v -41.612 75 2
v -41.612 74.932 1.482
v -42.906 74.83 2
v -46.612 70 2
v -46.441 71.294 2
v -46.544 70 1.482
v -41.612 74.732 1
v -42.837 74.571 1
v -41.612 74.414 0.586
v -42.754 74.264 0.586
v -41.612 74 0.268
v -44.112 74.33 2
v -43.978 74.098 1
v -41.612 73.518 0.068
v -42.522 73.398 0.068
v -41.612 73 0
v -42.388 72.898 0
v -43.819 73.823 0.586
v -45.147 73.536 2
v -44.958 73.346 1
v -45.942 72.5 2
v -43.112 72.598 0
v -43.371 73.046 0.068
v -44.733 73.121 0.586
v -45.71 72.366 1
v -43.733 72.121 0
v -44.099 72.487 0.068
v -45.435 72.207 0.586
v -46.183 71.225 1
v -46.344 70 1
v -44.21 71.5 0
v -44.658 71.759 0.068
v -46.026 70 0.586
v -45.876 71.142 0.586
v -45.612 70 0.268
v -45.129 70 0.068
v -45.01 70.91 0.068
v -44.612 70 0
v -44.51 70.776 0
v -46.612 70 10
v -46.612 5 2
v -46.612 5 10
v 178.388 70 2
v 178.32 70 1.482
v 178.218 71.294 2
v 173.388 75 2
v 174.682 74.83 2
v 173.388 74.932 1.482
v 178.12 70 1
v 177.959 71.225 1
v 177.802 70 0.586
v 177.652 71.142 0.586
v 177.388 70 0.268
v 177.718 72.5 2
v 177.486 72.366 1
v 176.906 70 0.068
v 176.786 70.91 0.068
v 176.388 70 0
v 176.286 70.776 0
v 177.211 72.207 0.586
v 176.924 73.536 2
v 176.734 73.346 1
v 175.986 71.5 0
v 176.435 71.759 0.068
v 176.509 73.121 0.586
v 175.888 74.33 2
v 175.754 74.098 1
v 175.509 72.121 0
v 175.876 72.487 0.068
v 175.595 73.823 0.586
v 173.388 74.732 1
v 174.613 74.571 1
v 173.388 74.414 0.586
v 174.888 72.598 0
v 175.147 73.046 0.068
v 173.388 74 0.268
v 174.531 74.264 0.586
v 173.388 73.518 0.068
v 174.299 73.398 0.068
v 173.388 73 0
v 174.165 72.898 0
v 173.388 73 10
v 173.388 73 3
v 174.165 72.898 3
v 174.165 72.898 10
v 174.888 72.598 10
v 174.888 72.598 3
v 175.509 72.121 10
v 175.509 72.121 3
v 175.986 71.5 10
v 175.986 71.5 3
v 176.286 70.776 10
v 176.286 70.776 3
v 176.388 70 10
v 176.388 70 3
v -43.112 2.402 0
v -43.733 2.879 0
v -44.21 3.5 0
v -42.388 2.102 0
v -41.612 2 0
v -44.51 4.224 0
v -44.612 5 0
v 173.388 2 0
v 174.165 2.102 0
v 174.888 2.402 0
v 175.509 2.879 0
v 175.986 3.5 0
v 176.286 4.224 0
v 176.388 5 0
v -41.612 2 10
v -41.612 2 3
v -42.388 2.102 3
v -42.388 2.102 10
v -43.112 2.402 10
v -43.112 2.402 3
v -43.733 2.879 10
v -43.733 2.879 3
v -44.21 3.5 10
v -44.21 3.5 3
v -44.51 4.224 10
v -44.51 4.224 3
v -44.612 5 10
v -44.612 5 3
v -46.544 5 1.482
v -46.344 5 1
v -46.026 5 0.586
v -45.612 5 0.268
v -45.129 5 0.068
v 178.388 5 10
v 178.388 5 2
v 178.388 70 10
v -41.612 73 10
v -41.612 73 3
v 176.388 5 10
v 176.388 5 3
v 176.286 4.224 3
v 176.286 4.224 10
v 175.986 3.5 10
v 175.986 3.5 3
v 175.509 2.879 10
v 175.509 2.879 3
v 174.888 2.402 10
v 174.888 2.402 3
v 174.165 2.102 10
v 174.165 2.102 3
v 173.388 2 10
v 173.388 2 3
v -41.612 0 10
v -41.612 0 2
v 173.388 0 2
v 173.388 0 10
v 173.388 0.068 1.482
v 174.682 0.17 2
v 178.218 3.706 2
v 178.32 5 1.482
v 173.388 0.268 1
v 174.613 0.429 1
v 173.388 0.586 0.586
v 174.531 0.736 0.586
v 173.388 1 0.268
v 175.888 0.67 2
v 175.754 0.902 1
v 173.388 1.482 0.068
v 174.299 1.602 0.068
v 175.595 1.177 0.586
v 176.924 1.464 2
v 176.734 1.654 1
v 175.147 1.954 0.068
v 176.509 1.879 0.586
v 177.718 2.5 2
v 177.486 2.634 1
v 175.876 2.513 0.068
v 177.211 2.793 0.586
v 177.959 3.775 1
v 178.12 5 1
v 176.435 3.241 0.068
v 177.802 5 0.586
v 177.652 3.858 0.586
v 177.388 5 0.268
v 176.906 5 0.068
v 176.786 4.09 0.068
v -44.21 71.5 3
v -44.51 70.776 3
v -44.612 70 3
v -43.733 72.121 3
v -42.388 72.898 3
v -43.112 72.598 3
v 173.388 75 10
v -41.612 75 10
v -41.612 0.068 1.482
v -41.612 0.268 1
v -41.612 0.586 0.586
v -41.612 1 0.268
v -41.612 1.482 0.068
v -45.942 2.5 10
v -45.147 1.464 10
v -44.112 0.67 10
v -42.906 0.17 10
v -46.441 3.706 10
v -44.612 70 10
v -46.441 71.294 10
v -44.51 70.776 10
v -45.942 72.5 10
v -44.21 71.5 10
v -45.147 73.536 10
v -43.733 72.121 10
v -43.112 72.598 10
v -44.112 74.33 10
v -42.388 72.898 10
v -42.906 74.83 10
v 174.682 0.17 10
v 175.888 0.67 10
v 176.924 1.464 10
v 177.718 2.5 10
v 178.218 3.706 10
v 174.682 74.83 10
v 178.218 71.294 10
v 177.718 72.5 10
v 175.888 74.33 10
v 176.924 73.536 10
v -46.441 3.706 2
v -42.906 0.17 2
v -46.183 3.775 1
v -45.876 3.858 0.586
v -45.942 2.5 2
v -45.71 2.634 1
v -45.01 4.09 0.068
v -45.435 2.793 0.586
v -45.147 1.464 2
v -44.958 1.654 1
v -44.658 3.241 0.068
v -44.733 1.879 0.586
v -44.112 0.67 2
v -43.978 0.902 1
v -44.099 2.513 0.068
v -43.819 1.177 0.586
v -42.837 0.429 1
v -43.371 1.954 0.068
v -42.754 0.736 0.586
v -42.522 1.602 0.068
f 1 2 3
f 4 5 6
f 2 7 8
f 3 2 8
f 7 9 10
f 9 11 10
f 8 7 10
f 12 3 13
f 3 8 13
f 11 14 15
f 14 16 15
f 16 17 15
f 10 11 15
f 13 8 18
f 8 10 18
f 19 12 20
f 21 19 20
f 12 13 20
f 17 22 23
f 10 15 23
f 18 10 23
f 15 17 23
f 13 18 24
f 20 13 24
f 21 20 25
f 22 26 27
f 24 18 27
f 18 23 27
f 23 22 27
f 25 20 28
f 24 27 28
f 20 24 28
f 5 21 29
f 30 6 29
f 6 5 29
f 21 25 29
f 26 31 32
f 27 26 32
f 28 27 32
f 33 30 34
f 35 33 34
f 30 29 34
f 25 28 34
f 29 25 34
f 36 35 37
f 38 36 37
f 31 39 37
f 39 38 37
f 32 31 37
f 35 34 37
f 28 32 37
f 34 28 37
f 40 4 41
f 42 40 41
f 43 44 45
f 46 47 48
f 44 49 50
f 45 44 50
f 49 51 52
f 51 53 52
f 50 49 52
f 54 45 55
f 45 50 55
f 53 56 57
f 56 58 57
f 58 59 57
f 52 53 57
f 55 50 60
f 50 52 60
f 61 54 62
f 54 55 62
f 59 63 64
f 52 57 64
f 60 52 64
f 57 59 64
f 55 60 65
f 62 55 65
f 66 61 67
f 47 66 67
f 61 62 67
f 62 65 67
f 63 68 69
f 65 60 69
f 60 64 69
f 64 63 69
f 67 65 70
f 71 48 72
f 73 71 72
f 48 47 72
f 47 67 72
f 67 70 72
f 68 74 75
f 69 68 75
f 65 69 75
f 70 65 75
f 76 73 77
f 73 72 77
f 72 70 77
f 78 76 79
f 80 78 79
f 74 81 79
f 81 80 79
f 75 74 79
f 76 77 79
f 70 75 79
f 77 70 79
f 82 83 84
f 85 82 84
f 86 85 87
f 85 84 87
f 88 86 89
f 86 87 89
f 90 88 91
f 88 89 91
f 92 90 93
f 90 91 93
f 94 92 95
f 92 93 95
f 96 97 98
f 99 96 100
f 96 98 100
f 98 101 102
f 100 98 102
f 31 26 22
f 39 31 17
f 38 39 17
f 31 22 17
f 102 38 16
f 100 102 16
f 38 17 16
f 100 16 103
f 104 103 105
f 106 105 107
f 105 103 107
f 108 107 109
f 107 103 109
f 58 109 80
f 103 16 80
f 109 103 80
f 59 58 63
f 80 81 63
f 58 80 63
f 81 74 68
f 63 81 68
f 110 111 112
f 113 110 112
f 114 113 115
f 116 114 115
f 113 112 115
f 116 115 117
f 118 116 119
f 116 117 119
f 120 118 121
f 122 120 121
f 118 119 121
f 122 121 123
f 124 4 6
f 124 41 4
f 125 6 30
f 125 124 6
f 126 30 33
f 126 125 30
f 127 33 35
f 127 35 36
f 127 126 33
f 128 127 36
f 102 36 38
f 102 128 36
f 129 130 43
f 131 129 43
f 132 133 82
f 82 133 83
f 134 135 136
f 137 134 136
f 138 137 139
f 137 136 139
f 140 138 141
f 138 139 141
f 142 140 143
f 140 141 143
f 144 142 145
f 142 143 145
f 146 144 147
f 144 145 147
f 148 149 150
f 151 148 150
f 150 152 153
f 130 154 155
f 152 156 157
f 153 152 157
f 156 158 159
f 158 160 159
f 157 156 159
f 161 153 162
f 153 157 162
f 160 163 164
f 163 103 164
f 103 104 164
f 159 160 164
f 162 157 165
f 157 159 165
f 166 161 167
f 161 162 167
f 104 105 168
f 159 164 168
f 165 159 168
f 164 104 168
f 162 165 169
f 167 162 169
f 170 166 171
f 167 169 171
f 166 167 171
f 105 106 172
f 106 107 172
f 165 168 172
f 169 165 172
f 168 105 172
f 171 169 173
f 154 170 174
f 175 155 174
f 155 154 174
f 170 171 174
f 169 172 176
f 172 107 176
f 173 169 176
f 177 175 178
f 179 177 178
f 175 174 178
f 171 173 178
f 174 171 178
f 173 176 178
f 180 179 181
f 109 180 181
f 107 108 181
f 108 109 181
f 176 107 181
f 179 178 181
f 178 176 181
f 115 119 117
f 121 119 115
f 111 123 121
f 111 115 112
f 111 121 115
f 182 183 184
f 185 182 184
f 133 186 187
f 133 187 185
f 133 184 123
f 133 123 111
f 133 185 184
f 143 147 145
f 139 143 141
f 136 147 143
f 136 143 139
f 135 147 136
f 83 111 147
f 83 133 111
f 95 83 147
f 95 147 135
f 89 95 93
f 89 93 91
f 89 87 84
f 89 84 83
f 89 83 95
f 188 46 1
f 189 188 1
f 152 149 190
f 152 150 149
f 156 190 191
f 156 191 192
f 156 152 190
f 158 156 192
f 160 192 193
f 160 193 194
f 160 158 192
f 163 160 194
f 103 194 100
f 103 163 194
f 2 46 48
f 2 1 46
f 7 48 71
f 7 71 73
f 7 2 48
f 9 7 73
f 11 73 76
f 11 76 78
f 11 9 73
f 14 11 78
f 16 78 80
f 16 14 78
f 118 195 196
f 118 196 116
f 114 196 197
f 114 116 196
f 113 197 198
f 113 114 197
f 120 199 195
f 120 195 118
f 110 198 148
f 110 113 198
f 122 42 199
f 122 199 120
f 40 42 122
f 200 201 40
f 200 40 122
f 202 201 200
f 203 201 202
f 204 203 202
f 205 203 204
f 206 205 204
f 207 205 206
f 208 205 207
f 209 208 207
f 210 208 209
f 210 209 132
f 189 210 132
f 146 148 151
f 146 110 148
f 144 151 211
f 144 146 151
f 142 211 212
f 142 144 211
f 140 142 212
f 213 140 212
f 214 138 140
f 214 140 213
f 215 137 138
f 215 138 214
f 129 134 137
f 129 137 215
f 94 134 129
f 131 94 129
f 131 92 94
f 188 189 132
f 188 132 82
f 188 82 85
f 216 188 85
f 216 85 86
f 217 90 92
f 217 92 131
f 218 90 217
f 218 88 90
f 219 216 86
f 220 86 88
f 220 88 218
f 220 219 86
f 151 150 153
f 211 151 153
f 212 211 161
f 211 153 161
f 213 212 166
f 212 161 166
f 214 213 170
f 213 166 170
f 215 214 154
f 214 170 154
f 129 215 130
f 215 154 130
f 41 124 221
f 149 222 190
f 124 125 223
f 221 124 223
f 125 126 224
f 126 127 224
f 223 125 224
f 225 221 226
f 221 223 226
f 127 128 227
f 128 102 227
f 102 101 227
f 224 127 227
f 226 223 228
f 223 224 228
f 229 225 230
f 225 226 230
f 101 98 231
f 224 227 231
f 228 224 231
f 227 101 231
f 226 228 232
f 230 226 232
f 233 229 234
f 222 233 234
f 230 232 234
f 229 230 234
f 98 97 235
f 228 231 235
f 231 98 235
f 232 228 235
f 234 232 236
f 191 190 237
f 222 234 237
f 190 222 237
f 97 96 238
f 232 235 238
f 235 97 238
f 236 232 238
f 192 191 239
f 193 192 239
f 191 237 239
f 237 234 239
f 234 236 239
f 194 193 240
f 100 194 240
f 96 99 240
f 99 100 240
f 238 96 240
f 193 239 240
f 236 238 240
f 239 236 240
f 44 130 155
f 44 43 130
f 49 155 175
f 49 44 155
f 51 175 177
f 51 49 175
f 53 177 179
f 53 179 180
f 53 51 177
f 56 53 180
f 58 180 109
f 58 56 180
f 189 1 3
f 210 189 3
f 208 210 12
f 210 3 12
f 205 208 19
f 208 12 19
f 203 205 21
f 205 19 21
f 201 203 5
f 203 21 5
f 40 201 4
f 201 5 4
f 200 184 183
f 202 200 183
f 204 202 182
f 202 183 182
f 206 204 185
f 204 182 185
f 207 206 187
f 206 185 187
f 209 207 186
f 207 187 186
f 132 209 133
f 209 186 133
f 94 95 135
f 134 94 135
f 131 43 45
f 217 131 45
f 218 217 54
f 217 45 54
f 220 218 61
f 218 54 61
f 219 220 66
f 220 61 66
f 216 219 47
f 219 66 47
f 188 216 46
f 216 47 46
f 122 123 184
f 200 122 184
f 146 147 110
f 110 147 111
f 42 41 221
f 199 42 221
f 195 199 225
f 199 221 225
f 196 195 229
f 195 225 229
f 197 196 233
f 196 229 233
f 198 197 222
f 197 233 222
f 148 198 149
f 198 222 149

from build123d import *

# Parameters (mm, degrees)
F1_DEPTH = 3
F2_DEPTH = 10
F3_R     = 2


# Not quite as in the source:
# - a feature names something its author has since deleted; it is built from what else it names


with BuildPart() as f1:
    # F0 (on Top) → F1 (new body)
    with BuildSketch(Plane.XY):
        with BuildLine():
            ThreePointArc((-44.6118305922, 5), (-43.7331509357, 2.8786796564), (-41.6118305922, 2))
            Line((-41.6118305922, 2), (173.3881694078, 2))
            ThreePointArc((173.3881694078, 2), (175.5094897514, 2.8786796564), (176.3881694078, 5))
            Line((176.3881694078, 5), (176.3881694078, 70))
            ThreePointArc((176.3881694078, 70), (175.5094897514, 72.1213203436), (173.3881694078, 73))
            Line((173.3881694078, 73), (-41.6118305922, 73))
            ThreePointArc((-41.6118305922, 73), (-43.7331509357, 72.1213203436), (-44.6118305922, 70))
            Line((-44.6118305922, 70), (-44.6118305922, 5))
        make_face()
    extrude(amount=F1_DEPTH)

    # F0 (on Top) → F2 (join)
    with BuildSketch(Plane.XY):
        with BuildLine():
            Line((173.3881694078, 75), (-41.6118305922, 75))
            ThreePointArc((-41.6118305922, 75), (-45.1473644981, 73.5355339059), (-46.6118305922, 70))
            Line((-46.6118305922, 70), (-46.6118305922, 5))
            ThreePointArc((-46.6118305922, 5), (-45.1473644981, 1.4644660941), (-41.6118305922, 0))
            Line((-41.6118305922, 0), (173.3881694078, 0))
            ThreePointArc((173.3881694078, 0), (176.9237033138, 1.4644660941), (178.3881694078, 5))
            Line((178.3881694078, 5), (178.3881694078, 70))
            ThreePointArc((178.3881694078, 70), (176.9237033138, 73.5355339059), (173.3881694078, 75))
        make_face()
        with BuildLine():
            Line((173.3881694078, 2), (-41.6118305922, 2))
            ThreePointArc((-41.6118305922, 2), (-43.7331509357, 2.8786796564), (-44.6118305922, 5))
            Line((-44.6118305922, 5), (-44.6118305922, 70))
            ThreePointArc((-44.6118305922, 70), (-43.7331509357, 72.1213203436), (-41.6118305922, 73))
            Line((-41.6118305922, 73), (173.3881694078, 73))
            ThreePointArc((173.3881694078, 73), (175.5094897514, 72.1213203436), (176.3881694078, 70))
            Line((176.3881694078, 70), (176.3881694078, 5))
            ThreePointArc((176.3881694078, 5), (175.5094897514, 2.8786796564), (173.3881694078, 2))
        make_face(mode=Mode.SUBTRACT)
    extrude(amount=F2_DEPTH)

    # F3
    f3_edges = [f1.edges().sort_by_distance(p)[0] for p in [
        (65.888169, 75, 0),
    ]]
    fillet(f3_edges, radius=F3_R)


solid = f1.part
